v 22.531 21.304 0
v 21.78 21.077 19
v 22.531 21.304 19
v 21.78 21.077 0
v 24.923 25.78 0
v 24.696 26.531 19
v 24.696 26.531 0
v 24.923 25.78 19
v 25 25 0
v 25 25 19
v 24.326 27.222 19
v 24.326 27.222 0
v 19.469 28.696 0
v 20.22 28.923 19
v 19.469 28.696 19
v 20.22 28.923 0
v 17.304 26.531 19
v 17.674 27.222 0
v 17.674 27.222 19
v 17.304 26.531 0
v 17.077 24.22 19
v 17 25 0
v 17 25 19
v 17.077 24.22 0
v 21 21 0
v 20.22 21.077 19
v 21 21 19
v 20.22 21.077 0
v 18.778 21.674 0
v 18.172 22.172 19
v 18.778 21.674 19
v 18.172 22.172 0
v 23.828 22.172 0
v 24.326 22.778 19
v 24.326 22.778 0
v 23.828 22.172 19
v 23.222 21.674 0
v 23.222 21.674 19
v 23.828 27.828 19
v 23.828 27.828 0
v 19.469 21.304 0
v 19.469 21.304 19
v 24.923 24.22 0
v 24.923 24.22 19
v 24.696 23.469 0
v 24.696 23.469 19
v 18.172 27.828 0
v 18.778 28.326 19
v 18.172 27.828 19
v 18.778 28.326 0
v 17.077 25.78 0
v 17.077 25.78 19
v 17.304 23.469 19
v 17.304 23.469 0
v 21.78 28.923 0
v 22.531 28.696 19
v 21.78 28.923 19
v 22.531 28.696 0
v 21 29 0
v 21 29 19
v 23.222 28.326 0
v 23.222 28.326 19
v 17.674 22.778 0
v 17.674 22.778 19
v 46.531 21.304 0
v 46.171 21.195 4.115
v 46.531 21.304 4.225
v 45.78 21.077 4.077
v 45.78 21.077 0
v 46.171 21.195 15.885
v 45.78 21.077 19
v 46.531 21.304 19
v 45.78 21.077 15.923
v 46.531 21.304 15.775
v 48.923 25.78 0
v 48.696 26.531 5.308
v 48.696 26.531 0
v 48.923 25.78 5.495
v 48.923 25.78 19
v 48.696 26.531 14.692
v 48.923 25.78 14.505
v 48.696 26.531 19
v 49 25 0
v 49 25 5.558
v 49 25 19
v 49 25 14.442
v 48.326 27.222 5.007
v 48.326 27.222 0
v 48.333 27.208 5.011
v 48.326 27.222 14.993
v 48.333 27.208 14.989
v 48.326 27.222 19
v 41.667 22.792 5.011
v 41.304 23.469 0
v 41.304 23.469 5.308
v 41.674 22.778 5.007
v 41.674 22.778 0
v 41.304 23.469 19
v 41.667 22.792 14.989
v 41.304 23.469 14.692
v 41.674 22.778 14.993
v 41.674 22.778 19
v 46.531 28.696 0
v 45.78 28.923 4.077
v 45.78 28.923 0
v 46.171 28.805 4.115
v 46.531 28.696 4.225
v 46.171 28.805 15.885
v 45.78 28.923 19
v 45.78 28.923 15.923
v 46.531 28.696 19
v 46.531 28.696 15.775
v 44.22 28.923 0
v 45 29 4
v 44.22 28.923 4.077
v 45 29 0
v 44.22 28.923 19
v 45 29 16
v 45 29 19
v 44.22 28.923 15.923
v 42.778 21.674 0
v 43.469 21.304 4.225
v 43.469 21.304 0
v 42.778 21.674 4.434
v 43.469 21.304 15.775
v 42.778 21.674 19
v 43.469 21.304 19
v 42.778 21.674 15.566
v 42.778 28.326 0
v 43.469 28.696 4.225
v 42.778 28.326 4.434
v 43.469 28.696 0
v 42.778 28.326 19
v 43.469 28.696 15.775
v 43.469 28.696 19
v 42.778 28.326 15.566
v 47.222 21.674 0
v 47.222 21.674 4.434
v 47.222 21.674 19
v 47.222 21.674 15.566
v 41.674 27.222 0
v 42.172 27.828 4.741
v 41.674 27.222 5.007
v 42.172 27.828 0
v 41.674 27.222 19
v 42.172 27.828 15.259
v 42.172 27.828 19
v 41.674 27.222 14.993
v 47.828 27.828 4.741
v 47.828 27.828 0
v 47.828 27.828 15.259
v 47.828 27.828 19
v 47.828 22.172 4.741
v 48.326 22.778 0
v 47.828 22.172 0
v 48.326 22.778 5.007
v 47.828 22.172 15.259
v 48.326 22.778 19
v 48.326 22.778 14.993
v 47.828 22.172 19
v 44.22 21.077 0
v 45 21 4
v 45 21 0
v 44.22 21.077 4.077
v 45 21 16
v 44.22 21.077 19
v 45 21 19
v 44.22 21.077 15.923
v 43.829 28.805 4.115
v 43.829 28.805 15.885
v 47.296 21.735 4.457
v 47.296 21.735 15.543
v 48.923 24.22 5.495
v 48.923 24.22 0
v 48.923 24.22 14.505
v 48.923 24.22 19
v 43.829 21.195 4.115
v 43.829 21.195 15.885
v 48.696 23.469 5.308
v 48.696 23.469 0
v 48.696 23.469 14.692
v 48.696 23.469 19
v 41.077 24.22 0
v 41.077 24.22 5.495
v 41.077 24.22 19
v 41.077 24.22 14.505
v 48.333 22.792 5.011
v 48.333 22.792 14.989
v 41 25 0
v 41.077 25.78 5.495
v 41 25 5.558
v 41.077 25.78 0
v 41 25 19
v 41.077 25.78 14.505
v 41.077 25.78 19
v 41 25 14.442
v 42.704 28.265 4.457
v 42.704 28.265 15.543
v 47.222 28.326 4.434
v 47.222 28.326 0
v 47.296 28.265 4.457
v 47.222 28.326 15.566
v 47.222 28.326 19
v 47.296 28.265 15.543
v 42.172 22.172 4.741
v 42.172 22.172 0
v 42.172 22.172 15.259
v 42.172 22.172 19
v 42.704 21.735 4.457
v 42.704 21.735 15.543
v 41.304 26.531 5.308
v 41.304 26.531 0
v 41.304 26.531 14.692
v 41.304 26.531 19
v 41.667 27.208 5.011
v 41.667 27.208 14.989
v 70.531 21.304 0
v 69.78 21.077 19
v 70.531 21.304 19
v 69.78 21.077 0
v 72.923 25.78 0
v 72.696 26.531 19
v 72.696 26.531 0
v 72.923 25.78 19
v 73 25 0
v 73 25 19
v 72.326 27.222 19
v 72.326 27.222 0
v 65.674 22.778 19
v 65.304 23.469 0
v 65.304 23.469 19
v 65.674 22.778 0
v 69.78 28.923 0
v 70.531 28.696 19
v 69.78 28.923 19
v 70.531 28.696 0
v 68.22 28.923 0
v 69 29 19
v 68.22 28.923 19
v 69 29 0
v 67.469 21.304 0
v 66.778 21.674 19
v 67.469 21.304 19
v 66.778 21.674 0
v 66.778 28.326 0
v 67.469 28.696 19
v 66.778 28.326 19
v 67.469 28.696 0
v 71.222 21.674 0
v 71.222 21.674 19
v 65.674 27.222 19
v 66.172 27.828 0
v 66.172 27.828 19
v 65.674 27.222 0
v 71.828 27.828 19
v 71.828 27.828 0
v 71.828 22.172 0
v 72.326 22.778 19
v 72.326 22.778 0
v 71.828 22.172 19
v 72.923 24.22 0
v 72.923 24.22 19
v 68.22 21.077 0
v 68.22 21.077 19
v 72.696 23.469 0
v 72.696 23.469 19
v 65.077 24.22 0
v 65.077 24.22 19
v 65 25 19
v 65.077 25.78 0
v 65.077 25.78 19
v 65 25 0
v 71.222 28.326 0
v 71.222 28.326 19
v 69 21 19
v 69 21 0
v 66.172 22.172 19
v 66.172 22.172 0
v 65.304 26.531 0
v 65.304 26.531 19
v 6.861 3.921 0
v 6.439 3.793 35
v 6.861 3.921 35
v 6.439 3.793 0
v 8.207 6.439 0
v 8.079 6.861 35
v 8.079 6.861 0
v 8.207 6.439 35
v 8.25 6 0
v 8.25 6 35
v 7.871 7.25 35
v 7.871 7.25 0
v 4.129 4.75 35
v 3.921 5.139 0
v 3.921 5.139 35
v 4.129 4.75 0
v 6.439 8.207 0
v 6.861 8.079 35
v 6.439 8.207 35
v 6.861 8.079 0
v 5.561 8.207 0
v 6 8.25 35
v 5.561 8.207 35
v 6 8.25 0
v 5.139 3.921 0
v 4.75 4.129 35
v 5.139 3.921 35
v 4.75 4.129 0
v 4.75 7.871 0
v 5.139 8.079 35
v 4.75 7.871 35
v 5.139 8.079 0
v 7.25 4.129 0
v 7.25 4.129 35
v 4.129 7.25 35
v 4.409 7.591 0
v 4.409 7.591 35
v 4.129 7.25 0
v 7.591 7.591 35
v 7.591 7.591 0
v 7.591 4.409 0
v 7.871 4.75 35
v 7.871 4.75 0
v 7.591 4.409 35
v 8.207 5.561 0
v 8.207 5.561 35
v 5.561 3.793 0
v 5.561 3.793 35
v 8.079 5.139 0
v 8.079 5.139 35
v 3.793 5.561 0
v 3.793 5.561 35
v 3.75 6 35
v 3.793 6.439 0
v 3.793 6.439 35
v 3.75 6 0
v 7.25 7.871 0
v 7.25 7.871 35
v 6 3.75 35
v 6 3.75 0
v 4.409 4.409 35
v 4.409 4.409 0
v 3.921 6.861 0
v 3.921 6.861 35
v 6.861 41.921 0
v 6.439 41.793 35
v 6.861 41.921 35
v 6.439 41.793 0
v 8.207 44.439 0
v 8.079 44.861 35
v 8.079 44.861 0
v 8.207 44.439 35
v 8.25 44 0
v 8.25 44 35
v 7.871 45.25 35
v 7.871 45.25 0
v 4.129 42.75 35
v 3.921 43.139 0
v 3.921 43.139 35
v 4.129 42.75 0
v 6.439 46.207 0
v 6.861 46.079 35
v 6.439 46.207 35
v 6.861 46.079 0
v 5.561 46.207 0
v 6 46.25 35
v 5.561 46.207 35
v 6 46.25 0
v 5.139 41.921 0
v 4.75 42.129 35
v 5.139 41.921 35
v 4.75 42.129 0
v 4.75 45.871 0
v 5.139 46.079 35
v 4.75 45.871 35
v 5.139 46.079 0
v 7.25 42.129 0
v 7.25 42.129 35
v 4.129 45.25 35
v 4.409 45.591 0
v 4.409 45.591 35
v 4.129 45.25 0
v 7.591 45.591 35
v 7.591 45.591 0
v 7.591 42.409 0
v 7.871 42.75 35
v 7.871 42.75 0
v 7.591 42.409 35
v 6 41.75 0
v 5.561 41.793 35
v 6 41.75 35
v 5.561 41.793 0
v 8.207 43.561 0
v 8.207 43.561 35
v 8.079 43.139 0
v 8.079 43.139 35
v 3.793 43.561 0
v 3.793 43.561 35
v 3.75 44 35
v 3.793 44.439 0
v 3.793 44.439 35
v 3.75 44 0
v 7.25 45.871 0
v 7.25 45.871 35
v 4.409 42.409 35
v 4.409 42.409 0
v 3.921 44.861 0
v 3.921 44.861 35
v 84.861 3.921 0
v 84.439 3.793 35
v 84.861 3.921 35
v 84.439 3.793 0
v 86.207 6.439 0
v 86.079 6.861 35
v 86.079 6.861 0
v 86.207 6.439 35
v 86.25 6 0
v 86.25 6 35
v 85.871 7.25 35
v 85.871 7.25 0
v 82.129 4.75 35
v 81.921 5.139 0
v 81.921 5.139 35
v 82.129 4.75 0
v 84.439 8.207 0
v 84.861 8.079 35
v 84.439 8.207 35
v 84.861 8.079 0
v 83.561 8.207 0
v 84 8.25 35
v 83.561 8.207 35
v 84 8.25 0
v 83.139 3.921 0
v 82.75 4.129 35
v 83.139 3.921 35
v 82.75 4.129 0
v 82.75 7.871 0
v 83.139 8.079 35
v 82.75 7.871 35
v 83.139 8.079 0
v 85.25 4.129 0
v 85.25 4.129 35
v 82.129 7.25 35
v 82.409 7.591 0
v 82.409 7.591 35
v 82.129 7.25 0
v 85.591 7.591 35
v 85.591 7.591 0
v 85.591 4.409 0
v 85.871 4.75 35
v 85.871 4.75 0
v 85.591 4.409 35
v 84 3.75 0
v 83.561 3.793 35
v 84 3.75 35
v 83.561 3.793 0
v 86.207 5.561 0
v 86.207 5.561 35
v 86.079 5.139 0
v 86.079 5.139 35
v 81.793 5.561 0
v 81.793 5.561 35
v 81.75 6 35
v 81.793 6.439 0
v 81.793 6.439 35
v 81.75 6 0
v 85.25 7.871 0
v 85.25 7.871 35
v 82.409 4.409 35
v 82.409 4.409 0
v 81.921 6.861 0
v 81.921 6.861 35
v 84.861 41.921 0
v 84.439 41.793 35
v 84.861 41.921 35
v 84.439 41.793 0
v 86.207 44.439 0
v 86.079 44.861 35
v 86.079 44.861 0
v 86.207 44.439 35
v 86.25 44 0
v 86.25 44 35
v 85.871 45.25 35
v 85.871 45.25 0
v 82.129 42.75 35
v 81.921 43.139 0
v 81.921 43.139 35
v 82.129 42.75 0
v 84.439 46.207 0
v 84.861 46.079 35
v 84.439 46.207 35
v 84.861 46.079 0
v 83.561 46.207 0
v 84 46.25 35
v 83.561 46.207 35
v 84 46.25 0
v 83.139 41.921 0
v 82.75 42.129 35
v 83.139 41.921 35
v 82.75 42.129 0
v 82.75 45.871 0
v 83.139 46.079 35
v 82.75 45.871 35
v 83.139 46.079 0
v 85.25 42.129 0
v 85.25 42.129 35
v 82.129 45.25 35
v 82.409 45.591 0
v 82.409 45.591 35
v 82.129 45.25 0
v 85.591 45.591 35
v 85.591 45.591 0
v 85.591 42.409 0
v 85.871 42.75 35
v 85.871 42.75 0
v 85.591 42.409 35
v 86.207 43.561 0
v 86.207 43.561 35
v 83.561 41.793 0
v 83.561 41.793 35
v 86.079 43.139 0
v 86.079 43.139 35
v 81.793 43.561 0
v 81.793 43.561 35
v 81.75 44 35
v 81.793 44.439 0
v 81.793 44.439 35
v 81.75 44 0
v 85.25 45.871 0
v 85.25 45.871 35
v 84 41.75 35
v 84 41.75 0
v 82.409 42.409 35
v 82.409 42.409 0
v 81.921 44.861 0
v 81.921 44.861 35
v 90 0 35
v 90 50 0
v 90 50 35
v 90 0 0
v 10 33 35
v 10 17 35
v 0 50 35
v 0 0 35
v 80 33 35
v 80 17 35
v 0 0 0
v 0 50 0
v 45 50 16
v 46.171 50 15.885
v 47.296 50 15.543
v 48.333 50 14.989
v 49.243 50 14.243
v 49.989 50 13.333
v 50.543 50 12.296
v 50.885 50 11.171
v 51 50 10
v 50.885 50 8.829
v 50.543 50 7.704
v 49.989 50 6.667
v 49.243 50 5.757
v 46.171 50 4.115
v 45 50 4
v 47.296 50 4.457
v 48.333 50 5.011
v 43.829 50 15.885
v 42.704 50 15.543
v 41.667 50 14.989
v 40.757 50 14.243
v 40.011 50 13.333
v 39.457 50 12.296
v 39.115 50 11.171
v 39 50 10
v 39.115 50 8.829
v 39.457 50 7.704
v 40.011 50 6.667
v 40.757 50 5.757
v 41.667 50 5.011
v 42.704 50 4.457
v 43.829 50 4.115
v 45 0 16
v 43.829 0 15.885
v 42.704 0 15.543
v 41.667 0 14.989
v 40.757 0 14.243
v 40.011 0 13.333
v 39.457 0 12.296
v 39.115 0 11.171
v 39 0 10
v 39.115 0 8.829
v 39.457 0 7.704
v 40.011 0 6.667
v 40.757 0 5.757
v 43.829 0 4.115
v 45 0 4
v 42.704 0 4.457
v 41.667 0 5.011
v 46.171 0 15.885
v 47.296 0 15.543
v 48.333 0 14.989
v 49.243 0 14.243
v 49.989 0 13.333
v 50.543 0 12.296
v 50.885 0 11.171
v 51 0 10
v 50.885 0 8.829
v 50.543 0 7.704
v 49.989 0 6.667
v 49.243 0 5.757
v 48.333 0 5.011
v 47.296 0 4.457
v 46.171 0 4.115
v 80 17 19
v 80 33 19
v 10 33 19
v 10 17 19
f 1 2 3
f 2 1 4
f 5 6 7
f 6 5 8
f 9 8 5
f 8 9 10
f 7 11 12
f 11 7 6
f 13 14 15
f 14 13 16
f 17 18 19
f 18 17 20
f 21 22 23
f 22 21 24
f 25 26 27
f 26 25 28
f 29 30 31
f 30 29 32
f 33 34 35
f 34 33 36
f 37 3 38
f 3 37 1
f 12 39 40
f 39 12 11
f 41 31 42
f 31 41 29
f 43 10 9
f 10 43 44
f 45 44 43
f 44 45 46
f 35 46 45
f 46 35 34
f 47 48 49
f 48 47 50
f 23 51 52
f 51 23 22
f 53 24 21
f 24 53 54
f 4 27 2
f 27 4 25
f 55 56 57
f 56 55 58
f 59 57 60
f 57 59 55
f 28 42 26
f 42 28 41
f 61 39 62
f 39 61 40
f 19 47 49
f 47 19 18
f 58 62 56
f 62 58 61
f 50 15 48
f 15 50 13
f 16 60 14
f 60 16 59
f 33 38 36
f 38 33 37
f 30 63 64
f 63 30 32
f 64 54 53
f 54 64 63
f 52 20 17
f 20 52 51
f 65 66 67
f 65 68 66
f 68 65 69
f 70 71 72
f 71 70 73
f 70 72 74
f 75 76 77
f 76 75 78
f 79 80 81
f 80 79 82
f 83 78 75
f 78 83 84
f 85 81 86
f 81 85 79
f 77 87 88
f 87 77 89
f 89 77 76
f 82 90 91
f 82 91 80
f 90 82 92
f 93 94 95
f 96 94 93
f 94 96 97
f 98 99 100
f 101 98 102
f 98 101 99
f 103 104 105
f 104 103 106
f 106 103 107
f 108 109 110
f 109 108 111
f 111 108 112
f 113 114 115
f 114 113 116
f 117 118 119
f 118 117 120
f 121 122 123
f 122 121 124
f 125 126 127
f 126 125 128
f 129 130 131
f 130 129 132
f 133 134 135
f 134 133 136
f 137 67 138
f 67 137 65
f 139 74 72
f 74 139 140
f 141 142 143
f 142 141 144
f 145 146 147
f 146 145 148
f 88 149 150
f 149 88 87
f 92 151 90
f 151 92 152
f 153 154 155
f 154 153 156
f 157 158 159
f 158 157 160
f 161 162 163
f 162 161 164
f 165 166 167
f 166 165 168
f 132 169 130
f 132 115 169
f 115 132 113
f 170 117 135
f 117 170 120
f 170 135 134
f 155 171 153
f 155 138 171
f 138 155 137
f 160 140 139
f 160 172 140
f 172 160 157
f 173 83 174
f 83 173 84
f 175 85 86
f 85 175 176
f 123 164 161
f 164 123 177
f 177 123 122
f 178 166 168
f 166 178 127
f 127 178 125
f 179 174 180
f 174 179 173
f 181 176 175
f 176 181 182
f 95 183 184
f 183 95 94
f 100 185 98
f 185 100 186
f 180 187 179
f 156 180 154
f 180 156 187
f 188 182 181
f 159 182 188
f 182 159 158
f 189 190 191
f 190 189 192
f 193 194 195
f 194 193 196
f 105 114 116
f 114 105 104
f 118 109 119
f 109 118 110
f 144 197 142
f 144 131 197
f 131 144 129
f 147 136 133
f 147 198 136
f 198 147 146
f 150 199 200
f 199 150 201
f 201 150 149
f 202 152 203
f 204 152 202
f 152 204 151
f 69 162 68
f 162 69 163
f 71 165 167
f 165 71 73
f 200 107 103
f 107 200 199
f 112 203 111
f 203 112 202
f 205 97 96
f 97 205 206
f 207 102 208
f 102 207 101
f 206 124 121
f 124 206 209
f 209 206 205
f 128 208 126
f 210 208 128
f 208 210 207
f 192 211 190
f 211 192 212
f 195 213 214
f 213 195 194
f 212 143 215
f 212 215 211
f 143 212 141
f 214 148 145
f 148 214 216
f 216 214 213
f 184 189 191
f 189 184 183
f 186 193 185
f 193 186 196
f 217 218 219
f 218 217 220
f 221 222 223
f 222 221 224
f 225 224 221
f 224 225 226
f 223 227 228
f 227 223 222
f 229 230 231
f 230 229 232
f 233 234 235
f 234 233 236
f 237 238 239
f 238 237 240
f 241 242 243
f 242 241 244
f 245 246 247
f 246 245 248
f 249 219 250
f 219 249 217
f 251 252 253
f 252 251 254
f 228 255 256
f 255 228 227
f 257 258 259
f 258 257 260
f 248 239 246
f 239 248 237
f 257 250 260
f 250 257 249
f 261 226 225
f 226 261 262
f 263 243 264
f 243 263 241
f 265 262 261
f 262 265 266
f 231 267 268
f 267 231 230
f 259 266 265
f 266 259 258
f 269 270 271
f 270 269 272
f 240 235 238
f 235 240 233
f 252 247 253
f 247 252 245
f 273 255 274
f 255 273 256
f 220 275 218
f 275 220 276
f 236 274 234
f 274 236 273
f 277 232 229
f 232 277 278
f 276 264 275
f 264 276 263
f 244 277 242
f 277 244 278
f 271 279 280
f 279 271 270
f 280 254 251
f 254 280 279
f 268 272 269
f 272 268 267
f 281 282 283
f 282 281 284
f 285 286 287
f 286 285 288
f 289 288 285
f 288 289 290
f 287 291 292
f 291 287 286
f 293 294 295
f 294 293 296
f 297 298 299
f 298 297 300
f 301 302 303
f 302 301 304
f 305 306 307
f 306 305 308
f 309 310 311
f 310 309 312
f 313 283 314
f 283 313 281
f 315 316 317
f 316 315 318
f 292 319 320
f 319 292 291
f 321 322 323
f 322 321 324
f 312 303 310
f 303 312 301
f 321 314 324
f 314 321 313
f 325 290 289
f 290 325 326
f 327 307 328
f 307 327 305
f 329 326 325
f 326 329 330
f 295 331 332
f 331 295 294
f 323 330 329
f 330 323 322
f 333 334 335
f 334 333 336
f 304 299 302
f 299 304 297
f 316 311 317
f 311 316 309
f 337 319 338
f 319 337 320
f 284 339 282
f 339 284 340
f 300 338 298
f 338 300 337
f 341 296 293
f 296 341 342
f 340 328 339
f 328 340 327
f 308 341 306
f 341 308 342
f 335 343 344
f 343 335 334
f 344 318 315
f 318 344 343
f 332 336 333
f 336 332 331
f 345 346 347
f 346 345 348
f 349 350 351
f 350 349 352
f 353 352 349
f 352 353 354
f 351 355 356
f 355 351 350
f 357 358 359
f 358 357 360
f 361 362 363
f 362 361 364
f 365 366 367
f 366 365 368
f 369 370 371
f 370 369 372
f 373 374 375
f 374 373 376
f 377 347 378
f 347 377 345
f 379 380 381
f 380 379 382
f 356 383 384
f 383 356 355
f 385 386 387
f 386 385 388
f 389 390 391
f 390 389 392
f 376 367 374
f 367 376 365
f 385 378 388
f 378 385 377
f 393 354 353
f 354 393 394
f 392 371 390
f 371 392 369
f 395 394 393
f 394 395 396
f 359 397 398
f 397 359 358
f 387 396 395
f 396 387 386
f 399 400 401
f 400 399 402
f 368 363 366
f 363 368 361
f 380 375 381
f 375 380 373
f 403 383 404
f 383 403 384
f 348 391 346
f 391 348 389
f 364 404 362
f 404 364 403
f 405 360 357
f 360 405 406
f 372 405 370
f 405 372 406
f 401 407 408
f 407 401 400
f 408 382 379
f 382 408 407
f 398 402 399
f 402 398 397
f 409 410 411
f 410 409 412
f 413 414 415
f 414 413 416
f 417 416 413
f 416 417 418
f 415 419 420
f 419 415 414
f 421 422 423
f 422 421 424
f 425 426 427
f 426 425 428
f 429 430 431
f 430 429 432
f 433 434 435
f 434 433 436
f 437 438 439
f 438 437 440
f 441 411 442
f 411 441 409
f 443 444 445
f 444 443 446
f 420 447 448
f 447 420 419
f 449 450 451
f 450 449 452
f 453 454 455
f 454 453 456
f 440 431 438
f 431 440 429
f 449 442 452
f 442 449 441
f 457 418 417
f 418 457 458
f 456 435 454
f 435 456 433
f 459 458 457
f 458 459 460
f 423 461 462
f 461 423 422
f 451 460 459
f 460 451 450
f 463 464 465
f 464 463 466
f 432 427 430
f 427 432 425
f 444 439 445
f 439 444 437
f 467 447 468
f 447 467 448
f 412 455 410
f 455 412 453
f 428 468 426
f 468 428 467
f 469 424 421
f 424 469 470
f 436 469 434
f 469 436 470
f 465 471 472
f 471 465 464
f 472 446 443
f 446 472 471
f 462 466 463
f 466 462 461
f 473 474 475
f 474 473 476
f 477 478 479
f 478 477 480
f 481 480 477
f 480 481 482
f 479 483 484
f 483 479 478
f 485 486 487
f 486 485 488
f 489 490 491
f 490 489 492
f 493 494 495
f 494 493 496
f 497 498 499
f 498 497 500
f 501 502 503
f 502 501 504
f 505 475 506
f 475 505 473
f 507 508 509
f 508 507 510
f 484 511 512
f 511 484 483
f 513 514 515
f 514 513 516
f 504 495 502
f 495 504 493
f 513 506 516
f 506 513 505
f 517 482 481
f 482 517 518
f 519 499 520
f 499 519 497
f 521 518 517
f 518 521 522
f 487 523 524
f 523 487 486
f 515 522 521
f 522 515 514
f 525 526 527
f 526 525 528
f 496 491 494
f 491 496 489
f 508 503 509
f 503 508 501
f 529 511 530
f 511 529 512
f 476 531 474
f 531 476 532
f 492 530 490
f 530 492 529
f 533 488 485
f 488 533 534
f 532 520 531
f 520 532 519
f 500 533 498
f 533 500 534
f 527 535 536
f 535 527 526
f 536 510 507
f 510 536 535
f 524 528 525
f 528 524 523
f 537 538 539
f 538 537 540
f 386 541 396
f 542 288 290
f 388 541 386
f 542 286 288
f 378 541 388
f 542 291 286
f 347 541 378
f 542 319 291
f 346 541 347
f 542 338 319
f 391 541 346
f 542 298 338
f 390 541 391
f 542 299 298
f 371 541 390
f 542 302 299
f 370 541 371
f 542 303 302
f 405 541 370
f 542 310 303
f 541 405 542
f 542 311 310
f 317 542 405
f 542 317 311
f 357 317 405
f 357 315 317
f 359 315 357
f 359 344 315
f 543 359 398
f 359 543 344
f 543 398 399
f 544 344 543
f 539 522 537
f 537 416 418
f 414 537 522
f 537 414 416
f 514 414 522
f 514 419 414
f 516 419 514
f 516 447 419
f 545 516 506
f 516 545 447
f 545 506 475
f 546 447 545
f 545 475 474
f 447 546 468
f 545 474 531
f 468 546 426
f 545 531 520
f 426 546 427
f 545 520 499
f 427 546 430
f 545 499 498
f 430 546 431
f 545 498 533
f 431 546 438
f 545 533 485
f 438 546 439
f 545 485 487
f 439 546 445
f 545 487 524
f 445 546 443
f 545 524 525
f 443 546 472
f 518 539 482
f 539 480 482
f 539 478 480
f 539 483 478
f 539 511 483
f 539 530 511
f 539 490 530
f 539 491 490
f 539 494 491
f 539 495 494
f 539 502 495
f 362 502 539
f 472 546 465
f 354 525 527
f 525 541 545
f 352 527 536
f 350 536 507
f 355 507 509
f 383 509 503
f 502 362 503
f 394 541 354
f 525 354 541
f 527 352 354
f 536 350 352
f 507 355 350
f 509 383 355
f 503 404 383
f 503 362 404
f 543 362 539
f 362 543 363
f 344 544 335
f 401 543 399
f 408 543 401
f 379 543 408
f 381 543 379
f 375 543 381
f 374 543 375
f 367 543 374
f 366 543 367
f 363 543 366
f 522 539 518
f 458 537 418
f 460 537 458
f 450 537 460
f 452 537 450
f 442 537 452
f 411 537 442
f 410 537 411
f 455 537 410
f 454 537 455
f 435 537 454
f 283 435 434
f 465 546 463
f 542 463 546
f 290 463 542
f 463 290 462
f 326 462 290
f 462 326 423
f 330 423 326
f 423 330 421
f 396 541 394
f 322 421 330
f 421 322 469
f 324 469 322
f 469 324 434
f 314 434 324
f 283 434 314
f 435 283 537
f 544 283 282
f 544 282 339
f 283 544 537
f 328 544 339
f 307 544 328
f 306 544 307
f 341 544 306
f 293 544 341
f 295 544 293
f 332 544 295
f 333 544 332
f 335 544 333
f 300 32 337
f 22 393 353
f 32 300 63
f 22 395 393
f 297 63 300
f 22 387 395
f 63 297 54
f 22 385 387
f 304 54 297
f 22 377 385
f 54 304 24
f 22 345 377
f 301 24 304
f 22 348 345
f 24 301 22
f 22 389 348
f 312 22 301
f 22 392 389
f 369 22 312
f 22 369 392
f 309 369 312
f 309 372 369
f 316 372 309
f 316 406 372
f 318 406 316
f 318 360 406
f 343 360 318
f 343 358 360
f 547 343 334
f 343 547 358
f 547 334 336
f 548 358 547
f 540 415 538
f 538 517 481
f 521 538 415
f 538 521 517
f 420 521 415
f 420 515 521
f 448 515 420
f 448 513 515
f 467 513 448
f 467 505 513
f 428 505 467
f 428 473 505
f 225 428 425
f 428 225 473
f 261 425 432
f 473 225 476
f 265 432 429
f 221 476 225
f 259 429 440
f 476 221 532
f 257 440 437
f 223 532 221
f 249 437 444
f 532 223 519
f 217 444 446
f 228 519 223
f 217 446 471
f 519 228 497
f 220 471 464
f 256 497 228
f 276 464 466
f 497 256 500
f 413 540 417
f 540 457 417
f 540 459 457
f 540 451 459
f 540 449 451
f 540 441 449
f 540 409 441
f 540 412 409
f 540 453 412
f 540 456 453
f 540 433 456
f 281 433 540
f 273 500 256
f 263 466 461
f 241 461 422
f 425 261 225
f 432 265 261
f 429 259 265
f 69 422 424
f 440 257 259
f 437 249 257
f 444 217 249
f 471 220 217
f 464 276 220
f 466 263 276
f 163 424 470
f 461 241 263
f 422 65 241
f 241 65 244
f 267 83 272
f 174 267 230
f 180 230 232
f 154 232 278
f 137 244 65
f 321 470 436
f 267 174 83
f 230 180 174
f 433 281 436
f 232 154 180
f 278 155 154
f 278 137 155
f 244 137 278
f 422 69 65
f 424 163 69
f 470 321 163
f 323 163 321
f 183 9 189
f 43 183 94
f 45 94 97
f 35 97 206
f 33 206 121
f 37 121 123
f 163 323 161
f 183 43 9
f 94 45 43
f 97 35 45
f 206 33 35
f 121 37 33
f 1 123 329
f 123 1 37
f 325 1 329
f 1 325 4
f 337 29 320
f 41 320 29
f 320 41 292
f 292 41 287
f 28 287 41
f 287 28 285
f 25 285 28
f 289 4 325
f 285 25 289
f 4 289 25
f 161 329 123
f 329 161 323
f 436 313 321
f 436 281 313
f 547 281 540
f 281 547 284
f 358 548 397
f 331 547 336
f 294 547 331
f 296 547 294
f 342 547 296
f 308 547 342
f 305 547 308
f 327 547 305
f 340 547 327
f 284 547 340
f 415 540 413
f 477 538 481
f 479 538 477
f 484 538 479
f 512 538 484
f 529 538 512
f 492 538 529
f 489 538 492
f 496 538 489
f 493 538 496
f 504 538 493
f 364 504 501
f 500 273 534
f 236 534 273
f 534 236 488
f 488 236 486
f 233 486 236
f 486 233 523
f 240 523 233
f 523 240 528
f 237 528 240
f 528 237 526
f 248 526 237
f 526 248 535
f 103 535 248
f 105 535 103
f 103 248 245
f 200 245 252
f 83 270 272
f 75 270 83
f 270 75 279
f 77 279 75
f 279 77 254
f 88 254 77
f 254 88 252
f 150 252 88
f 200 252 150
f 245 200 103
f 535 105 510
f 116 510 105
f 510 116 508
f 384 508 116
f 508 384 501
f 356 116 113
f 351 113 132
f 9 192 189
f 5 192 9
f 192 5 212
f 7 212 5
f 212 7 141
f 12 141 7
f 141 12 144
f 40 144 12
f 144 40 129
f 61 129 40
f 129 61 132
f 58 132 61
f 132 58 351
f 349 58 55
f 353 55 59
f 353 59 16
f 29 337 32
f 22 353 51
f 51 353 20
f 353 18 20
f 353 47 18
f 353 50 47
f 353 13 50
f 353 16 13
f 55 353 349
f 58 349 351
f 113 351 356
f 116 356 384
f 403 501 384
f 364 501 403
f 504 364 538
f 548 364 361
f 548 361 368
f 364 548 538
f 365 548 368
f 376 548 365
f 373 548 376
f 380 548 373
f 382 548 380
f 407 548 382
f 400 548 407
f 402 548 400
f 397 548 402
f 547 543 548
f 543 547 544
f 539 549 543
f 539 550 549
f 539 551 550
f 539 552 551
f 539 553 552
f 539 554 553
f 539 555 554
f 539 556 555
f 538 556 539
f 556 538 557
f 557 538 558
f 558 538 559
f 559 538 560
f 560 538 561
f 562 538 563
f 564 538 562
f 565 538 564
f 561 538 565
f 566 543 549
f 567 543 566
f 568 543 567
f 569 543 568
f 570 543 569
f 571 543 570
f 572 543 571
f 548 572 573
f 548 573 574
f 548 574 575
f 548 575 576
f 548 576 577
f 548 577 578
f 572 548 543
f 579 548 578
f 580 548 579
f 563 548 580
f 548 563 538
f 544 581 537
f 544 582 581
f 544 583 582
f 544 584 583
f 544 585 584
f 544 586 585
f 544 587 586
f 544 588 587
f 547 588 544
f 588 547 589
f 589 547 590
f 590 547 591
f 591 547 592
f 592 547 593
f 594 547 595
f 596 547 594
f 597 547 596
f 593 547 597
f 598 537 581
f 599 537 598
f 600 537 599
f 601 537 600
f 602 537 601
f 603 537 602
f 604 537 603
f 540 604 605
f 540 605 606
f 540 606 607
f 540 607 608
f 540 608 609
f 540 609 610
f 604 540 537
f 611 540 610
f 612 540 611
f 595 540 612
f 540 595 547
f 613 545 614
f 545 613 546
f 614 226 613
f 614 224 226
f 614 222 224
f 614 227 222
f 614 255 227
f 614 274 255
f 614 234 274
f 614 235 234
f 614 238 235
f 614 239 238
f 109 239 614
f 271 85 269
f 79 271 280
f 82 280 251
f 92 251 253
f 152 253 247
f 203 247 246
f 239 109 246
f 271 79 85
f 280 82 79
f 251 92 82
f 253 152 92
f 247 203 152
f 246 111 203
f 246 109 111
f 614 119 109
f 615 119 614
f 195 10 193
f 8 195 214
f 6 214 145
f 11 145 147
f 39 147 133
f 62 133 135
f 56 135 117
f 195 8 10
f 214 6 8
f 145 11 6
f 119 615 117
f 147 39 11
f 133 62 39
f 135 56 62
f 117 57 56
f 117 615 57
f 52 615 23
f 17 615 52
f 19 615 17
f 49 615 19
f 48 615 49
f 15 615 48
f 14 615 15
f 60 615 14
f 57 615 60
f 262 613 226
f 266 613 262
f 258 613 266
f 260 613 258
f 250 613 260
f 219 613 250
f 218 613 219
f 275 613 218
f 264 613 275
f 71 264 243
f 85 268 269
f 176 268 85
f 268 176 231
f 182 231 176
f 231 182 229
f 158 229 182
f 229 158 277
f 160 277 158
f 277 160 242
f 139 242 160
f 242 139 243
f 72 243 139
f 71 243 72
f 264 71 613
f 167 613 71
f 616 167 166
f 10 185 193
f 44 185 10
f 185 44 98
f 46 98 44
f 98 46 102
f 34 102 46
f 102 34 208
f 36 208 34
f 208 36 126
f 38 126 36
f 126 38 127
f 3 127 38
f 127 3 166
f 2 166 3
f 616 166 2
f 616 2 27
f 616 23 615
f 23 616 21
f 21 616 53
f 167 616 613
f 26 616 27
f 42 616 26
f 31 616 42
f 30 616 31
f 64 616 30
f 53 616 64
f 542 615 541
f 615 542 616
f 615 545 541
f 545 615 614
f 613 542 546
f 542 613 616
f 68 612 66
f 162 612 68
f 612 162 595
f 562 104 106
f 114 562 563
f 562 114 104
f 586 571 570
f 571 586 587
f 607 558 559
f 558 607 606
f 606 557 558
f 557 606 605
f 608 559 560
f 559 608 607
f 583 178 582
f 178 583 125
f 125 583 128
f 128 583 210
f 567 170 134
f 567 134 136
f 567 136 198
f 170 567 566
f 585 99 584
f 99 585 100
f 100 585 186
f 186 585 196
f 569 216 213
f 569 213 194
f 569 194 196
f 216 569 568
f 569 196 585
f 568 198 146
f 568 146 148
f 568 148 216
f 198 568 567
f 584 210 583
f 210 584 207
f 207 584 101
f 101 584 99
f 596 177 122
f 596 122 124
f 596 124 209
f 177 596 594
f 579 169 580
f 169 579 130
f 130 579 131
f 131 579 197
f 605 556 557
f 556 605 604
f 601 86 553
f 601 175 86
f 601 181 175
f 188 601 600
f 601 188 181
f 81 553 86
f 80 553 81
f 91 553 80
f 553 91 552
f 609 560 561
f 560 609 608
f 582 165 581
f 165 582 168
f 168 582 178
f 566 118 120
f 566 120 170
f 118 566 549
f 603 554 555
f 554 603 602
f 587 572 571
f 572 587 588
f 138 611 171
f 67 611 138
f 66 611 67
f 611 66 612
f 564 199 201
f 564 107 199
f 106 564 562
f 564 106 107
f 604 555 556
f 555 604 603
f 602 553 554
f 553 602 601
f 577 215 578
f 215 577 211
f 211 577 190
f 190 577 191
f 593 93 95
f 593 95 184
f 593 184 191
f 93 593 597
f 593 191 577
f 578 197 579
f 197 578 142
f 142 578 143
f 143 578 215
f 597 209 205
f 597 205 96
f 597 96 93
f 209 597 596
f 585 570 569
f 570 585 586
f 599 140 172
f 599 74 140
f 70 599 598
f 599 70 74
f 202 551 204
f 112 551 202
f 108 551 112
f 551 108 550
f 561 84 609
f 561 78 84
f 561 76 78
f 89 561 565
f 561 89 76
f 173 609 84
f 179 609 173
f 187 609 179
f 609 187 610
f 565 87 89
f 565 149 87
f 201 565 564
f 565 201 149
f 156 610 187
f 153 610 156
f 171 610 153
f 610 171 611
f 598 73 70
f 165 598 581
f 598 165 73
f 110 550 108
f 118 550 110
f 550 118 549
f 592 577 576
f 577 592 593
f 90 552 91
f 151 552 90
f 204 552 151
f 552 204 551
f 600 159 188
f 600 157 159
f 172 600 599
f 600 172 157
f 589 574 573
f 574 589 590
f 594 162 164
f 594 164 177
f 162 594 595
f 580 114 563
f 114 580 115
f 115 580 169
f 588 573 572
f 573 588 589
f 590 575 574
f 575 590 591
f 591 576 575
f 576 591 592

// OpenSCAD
$fn = 32;

// ----------------------------------------------------------------------
// Manifold block: side_outlet manifold
// ----------------------------------------------------------------------

// --- parameters (mm) ---
block_l = 90;             // block length, X
block_w = 50;             // block width, Y
block_h = 35;             // block height, Z
port_d = 8;               // port bore diameter
port_pitch = 24;          // port pitch along X
gallery_d = 16;           // top gallery width, Y
gallery_depth = 16;       // gallery pocket depth
wall_p = 10;              // gallery end wall thickness, X
mnt_d = 4.5;              // mounting hole diameter
mnt_in = 6;               // mounting hole inset from the edges
out_d = 12;               // outlet bore diameter
out_z = 10;               // outlet axis height
fit_tol = 0.02;           // tolerance for press fits, mm
free_tol = 0.2;           // tolerance for clearance fits, mm

n_ports = 3;  // ports in the row
port_x0 = (block_l - (n_ports - 1) * port_pitch) / 2;  // first port X

difference() {
  cube([block_l, block_w, block_h]);
  for (i = [0 : n_ports - 1])
    translate([port_x0 + i * port_pitch, block_w / 2, -1])
      cylinder(h = block_h + 2, d = port_d);
  translate([wall_p, block_w / 2 - gallery_d / 2, block_h - gallery_depth])
    cube([block_l - 2 * wall_p, gallery_d, gallery_depth + 1]);
  for (cx = [mnt_in, block_l - mnt_in])
    for (cy = [mnt_in, block_w - mnt_in])
      translate([cx, cy, -1]) cylinder(h = block_h + 2, d = mnt_d);
  translate([block_l / 2, -1, out_z]) rotate([-90, 0, 0])
    cylinder(h = block_w + 2, d = out_d);
}
